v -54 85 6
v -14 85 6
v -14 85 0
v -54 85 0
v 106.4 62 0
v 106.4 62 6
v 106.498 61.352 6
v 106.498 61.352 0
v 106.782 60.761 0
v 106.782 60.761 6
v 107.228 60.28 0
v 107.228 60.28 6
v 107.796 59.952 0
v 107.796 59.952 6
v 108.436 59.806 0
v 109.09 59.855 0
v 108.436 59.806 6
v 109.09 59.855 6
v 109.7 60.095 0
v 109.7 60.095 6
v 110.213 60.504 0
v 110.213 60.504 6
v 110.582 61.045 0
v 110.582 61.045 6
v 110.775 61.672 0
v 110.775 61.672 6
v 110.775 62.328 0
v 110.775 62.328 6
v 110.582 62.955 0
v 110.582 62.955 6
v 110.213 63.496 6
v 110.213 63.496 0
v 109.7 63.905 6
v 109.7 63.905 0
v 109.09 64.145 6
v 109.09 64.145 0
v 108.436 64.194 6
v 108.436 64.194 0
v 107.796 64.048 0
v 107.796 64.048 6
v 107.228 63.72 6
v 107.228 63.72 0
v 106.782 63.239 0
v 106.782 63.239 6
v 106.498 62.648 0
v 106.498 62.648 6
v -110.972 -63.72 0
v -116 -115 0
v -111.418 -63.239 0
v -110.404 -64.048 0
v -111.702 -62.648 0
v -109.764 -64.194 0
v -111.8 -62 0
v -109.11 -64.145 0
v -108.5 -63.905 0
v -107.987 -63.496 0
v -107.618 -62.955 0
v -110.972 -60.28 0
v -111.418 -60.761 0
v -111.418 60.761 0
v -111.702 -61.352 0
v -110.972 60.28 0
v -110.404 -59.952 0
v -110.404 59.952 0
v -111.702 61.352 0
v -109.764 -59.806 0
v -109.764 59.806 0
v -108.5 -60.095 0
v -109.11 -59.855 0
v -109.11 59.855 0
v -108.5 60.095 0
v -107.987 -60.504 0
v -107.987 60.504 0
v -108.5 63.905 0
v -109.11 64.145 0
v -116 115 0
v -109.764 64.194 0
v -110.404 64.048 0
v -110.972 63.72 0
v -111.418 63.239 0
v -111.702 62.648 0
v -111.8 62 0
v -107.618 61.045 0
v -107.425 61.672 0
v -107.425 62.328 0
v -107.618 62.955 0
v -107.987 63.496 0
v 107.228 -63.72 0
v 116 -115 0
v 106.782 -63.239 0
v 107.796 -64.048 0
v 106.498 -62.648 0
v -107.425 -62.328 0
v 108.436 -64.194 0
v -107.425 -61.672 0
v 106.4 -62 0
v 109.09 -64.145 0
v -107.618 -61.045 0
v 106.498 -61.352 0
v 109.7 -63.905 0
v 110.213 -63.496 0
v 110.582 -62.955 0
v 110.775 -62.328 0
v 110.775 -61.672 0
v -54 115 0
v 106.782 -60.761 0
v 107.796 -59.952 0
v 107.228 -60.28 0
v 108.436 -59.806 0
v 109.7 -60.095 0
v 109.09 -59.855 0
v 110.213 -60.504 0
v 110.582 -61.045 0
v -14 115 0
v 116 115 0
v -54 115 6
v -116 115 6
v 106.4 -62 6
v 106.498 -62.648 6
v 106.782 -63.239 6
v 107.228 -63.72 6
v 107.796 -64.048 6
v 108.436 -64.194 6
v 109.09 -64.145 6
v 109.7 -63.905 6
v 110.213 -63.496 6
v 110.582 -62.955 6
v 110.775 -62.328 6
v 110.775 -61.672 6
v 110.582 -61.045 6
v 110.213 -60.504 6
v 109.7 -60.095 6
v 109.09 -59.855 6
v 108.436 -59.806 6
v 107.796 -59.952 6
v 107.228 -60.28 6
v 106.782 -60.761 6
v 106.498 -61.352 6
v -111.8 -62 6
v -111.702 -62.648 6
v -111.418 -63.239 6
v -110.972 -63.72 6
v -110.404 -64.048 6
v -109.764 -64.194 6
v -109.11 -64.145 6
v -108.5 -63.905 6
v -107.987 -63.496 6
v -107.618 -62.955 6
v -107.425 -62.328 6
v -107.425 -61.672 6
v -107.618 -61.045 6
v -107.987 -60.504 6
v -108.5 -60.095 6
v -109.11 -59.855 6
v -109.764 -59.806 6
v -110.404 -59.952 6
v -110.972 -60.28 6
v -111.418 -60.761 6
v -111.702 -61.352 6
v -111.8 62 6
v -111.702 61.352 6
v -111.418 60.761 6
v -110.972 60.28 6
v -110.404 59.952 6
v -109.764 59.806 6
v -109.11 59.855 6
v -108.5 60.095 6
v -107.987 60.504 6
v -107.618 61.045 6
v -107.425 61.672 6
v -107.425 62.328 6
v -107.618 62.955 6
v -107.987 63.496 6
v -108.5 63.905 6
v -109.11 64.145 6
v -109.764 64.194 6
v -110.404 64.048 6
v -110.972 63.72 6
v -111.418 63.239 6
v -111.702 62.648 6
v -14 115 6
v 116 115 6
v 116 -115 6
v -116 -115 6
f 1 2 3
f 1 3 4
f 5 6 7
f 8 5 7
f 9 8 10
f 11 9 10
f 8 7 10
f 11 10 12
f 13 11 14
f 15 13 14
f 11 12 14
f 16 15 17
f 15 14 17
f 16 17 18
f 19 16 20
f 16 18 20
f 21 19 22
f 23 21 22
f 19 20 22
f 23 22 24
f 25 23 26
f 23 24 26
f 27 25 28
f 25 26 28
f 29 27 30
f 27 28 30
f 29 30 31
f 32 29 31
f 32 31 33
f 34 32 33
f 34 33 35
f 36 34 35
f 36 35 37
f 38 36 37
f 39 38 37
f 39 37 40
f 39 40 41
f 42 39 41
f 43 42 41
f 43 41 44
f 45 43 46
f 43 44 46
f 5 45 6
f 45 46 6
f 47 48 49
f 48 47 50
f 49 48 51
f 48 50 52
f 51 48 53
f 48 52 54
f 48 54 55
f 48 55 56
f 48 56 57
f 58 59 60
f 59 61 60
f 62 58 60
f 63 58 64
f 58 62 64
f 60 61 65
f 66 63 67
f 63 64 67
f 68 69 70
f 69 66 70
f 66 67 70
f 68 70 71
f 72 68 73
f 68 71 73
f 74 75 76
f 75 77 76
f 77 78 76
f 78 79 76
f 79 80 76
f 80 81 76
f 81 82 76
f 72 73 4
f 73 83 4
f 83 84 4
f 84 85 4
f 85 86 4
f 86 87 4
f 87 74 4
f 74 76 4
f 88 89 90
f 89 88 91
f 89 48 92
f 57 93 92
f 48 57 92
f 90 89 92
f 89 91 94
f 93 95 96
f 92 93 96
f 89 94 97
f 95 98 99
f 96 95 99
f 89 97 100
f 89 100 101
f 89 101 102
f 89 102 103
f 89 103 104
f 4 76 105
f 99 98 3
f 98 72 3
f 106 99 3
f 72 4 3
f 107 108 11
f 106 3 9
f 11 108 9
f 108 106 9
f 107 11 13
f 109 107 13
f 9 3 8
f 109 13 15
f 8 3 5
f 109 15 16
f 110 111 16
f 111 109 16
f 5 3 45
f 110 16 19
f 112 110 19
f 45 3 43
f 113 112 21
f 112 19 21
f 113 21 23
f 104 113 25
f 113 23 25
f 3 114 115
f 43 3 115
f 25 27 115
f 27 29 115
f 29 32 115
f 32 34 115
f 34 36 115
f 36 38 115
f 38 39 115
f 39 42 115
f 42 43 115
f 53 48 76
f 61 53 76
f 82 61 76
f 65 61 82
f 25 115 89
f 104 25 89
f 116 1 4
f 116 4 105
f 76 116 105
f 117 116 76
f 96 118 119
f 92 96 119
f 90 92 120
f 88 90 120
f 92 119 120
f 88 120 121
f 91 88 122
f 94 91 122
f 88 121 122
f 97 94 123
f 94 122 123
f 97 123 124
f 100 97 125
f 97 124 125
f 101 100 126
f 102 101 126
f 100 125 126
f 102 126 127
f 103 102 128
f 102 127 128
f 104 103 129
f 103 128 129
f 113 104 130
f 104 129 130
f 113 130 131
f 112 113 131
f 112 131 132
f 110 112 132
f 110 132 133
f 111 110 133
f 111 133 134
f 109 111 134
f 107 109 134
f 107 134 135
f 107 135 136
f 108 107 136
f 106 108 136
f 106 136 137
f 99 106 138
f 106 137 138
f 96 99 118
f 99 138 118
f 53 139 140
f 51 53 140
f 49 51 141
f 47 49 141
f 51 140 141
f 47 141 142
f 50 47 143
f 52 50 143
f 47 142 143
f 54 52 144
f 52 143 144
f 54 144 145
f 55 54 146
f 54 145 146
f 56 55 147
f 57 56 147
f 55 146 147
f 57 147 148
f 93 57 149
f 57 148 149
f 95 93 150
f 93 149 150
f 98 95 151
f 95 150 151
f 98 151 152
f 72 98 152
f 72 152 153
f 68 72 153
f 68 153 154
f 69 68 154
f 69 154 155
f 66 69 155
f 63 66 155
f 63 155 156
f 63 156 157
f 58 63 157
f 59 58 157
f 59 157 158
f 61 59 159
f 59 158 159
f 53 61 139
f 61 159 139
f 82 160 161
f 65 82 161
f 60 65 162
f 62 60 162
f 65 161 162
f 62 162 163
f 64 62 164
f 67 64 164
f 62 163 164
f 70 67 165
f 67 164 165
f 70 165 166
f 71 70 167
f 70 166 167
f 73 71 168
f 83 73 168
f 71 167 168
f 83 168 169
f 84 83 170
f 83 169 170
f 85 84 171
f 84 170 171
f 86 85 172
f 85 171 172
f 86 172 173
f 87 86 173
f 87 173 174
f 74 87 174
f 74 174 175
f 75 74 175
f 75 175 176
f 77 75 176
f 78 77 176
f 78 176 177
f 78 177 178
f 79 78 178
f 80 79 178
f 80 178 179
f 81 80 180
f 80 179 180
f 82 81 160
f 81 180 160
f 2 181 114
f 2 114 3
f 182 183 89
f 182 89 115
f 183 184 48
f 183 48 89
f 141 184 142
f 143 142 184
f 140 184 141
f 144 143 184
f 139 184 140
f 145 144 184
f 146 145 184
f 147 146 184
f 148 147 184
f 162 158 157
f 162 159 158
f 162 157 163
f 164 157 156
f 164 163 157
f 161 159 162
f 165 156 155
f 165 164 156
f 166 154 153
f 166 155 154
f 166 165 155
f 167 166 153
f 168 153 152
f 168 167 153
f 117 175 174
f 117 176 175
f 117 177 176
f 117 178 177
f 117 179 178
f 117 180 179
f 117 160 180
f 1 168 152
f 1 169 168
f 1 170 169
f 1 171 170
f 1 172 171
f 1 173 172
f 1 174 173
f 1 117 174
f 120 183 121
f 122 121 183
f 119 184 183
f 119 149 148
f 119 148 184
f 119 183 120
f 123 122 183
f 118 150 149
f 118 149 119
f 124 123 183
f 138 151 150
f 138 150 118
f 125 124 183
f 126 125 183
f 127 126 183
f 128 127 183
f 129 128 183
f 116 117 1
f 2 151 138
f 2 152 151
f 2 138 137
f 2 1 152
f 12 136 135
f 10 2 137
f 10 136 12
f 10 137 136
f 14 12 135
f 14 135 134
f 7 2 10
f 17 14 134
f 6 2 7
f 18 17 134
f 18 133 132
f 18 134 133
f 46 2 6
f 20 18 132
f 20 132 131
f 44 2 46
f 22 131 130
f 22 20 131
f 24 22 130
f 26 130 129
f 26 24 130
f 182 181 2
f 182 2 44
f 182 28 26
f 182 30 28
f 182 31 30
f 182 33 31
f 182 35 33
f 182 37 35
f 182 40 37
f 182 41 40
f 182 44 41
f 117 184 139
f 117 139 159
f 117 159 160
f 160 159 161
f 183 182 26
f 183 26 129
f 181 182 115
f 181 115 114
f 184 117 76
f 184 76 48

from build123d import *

# Parameters (mm, degrees)
SKETCH1_R           = 2.2
BOSS_EXTRUDE1_DEPTH = 6


with BuildPart() as part:
    # Sketch1 → Boss-Extrude1 (new body)
    with BuildSketch(Plane.XY.offset(6)):
        Polygon((-54, 85), (-54, 115), (-116, 115), (-116, -115), (116, -115), (116, 115), (-14, 115), (-14, 85), align=None)
        with Locations(Location((-109.6, 62, 0), (0, 0, 180))):
            Circle(SKETCH1_R, mode=Mode.SUBTRACT)
        with Locations(Location((108.6, -62, 0), (0, 0, 180))):
            Circle(SKETCH1_R, mode=Mode.SUBTRACT)
        with Locations(Location((108.6, 62, 0), (0, 0, 180))):
            Circle(SKETCH1_R, mode=Mode.SUBTRACT)
        with Locations(Location((-109.6, -62, 0), (0, 0, 180))):
            Circle(SKETCH1_R, mode=Mode.SUBTRACT)
    extrude(amount=-BOSS_EXTRUDE1_DEPTH)


solid = part.part
